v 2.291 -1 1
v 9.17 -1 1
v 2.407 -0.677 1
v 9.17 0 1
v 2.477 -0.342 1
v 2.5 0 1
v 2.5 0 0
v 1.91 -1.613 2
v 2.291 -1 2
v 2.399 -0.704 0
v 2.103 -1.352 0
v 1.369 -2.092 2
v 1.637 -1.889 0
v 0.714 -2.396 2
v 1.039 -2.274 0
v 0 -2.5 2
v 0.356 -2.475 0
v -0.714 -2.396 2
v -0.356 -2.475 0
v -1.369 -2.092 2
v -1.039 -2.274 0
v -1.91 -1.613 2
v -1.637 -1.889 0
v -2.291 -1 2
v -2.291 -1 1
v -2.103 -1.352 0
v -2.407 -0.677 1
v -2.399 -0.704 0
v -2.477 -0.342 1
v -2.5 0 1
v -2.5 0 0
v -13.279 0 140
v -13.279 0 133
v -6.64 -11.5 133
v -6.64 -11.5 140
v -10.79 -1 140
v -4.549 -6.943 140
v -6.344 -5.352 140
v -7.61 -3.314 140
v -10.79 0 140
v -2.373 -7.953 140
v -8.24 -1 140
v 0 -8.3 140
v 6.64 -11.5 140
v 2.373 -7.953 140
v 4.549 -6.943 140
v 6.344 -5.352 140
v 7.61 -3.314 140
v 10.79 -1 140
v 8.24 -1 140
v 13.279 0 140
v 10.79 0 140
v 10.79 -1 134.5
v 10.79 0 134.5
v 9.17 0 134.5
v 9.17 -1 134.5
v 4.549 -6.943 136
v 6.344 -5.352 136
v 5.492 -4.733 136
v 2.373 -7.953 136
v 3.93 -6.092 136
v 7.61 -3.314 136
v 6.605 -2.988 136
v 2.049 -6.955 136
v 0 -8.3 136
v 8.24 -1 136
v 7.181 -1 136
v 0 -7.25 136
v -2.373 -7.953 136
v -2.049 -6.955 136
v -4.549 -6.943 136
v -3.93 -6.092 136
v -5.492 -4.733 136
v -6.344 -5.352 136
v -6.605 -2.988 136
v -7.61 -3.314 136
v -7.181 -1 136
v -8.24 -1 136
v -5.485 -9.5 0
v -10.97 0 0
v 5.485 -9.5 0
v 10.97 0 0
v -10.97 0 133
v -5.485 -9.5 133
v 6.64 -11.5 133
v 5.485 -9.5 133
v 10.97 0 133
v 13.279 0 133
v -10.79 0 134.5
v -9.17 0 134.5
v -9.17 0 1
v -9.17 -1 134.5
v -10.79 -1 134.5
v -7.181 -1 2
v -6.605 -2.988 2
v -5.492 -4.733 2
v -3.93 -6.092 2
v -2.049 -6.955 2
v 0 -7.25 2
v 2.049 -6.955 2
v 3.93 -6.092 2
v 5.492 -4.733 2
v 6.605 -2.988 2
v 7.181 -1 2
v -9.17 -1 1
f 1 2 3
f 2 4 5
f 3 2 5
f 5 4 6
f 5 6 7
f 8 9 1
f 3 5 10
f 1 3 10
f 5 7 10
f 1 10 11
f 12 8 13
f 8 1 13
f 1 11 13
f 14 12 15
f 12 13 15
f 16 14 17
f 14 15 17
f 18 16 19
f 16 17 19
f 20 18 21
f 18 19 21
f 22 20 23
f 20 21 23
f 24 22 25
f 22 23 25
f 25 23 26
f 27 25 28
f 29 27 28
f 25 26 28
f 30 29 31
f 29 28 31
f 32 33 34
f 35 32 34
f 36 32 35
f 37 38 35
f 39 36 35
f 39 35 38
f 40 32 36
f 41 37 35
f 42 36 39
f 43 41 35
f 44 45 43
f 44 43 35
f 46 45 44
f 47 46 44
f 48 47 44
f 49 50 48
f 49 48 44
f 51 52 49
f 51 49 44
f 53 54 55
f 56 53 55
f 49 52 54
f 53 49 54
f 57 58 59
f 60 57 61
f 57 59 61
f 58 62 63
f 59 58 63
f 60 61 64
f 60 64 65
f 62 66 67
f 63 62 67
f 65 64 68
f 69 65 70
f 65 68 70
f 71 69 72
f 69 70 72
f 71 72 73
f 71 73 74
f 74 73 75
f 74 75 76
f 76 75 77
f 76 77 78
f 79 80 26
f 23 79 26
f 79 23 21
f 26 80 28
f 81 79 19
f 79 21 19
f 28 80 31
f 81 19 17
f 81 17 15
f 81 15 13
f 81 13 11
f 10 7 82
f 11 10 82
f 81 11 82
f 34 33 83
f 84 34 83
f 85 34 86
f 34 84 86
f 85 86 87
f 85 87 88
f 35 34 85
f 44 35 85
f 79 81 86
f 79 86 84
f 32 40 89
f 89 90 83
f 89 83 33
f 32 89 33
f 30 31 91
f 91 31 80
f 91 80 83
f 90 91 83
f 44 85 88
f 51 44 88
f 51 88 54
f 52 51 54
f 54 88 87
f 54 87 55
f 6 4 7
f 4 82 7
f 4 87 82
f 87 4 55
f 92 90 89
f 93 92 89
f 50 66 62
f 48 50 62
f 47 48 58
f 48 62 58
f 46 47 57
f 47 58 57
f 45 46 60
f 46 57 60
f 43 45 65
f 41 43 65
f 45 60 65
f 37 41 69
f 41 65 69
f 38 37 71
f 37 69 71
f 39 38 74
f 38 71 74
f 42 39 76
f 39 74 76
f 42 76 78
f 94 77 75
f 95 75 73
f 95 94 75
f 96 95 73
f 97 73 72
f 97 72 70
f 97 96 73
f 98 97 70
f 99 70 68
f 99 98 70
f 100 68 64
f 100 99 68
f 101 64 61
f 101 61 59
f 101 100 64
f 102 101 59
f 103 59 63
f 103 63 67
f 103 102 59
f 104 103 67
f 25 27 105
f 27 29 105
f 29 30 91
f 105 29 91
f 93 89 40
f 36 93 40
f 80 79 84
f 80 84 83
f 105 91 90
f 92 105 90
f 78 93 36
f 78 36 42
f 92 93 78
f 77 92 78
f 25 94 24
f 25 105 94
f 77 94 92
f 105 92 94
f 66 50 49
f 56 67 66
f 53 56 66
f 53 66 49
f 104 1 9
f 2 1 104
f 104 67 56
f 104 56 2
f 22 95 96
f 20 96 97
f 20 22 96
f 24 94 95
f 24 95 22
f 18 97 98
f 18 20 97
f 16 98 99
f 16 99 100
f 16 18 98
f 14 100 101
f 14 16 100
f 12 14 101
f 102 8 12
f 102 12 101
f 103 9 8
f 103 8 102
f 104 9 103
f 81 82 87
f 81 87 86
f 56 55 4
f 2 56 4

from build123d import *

# Parameters (mm, degrees)
AUFSATZ_LINEAR_AUSTRAGEN1_DEPTH = 136
AUFSATZ_LINEAR_AUSTRAGEN2_DEPTH = 2
AUFSATZ_LINEAR_AUSTRAGEN3_DEPTH = 7
SCHNITT_LINEAR_AUSTRAGEN2_DEPTH = 1
SCHNITT_LINEAR_AUSTRAGEN1_REACH = 143.098
SKIZZE14_R                      = 2.5


with BuildPart() as part:
    # Skizze1 → Aufsatz-Linear austragen1 (new body)
    with BuildSketch(Plane.XY):
        with BuildLine():
            Line((7.25, 0), (10.969655115, 0))
            Line((10.969655115, 0), (5.484827557, -9.5))
            Line((5.484827557, -9.5), (-5.484827557, -9.5))
            Line((-5.484827557, -9.5), (-10.969655115, 0))
            Line((-10.969655115, 0), (-7.25, 0))
            ThreePointArc((-7.25, 0), (0, -7.25), (7.25, 0))
        make_face()
    extrude(amount=AUFSATZ_LINEAR_AUSTRAGEN1_DEPTH)

    # Skizze2 → Aufsatz-Linear austragen2 (add)
    with BuildSketch(Plane.XY):
        with BuildLine():
            Line((7.25, 0), (-7.25, 0))
            ThreePointArc((-7.25, 0), (0, -7.25), (7.25, 0))
        make_face()
    extrude(amount=AUFSATZ_LINEAR_AUSTRAGEN2_DEPTH)

    # Skizze3 → Aufsatz-Linear austragen3 (add)
    with BuildSketch(Plane.XY.offset(133)):
        with BuildLine():
            Line((-8.3, 0), (-13.279056191, 0))
            Line((-13.279056191, 0), (-6.639528096, -11.5))
            Line((-6.639528096, -11.5), (6.639528096, -11.5))
            Line((6.639528096, -11.5), (13.279056191, 0))
            Line((13.279056191, 0), (8.3, 0))
            ThreePointArc((8.3, 0), (0, -8.3), (-8.3, 0))
        make_face()
    extrude(amount=AUFSATZ_LINEAR_AUSTRAGEN3_DEPTH)

    # Skizze13 → Schnitt-Linear austragen2 (cut)
    with BuildSketch(Plane(origin=(0, 0, 0), x_dir=(1, 0, 0), z_dir=(0, 1, 0))):
        Polygon((-10.789528096, -140), (10.789528096, -140), (10.789528096, -134.5), (9.169655115, -134.5), (9.169655115, -1), (-9.169655115, -1), (-9.169655115, -134.5), (-10.789528096, -134.5), align=None)
    extrude(amount=-SCHNITT_LINEAR_AUSTRAGEN2_DEPTH, mode=Mode.SUBTRACT)

    # Schnitt-Linear austragen1: up to this face of the body (flat: up to its plane)
    schnitt_linear_austragen1_end = Plane(part.part.faces().sort_by_distance((0, -3.624030572, 2))[0])
    # Skizze14 → Schnitt-Linear austragen1 (cut, up to the picked face)
    with BuildSketch(Plane(origin=(0, 0, 0), x_dir=(-1, 0, 0), z_dir=(0, 0, -1)), mode=Mode.PRIVATE) as schnitt_linear_austragen1_sk1:
        Circle(SKIZZE14_R)
    schnitt_linear_austragen1_tool1 = split(extrude(schnitt_linear_austragen1_sk1.sketch, amount=-SCHNITT_LINEAR_AUSTRAGEN1_REACH, mode=Mode.PRIVATE), bisect_by=schnitt_linear_austragen1_end, keep=Keep.BOTH, mode=Mode.PRIVATE)
    add(schnitt_linear_austragen1_tool1.solids().sort_by(Axis((0, 0, 0), (0, 0, 1)))[0], mode=Mode.SUBTRACT)


solid = part.part
